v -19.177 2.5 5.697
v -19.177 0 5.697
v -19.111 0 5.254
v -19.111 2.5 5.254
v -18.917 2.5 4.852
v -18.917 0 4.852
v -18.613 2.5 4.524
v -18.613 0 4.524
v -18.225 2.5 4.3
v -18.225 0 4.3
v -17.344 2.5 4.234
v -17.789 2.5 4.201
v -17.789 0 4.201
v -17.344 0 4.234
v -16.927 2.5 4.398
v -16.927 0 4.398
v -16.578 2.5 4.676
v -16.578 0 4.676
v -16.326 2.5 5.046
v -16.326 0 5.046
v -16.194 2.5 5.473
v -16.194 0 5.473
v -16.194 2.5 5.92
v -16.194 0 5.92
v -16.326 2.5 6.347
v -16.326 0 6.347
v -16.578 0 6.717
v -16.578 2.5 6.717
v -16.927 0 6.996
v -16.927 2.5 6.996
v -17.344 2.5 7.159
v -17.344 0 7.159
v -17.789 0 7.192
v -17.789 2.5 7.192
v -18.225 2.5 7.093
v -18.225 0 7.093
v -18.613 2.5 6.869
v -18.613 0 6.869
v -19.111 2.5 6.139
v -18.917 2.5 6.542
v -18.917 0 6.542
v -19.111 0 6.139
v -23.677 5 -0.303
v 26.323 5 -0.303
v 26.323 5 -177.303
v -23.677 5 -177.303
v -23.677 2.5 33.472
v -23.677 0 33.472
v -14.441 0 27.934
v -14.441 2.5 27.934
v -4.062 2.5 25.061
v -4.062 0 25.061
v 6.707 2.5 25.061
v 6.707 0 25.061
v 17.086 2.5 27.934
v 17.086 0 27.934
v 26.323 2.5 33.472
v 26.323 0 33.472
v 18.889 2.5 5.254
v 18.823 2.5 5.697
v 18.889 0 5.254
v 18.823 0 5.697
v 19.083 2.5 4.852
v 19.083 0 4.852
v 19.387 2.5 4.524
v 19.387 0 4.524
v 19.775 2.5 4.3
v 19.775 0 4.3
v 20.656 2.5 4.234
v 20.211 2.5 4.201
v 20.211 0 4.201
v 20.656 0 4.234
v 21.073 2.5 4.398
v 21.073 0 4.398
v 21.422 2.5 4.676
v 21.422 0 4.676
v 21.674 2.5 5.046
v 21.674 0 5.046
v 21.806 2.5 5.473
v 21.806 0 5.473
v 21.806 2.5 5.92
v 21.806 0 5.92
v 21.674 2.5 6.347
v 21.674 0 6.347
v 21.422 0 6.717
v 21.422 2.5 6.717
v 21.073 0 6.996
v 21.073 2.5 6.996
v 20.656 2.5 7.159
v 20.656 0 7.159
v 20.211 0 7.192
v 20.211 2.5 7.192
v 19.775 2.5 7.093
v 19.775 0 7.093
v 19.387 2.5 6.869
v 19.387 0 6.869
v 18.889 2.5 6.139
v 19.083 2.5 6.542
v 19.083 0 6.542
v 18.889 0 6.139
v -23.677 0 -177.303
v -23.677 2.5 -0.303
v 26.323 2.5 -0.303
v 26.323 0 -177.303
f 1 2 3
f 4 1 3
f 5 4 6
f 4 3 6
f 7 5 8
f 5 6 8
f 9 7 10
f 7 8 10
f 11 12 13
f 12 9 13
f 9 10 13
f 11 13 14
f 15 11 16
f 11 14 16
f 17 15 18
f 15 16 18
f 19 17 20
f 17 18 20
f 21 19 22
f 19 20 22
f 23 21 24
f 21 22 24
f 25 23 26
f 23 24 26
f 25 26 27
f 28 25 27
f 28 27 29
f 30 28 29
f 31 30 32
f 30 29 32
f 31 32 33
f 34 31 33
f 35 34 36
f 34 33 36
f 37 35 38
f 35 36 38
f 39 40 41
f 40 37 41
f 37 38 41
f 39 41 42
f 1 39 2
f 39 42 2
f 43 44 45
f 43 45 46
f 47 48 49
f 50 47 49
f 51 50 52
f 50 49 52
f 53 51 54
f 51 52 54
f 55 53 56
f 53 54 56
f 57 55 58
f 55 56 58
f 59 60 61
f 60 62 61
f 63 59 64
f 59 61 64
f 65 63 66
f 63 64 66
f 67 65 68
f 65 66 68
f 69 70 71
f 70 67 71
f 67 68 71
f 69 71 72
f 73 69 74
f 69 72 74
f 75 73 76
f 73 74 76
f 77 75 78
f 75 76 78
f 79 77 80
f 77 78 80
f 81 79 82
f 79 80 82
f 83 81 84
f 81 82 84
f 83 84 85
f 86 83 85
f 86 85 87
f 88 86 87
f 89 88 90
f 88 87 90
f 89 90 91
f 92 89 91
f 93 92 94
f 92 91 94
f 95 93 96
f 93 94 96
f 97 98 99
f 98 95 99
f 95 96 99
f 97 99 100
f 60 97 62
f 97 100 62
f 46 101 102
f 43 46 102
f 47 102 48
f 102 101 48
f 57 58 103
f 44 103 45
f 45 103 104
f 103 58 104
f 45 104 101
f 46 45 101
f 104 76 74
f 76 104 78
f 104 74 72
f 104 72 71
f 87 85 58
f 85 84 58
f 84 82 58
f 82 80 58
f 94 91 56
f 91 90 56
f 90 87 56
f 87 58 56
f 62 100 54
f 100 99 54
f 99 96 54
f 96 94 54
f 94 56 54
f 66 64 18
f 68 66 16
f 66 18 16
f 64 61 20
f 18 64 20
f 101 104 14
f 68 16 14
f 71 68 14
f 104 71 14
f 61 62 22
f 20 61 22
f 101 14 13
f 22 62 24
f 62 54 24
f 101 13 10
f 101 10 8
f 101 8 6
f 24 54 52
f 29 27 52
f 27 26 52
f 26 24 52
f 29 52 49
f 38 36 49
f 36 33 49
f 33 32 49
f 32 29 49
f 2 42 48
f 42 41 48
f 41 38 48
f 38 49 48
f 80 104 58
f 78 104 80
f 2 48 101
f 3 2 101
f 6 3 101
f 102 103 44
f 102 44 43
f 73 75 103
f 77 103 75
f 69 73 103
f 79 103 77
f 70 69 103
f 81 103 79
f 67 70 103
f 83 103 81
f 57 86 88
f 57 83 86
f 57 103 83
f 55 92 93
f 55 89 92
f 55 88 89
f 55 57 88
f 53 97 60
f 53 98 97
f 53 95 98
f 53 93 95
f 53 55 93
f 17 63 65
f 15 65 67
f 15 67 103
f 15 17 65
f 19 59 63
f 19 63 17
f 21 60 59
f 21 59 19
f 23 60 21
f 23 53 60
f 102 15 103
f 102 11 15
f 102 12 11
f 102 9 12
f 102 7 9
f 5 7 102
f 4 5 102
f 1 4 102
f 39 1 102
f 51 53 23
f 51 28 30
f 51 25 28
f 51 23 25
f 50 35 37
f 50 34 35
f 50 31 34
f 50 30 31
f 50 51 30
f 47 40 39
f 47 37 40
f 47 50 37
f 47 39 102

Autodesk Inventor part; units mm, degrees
ref_plane "YZ Plane" through (0, 0, 0) normal (1, 0, 0) x (0, 1, 0)
ref_plane "XZ Plane" through (0, 0, 0) normal (0, 1, 0) x (-1, 0, 0)
ref_plane "XY Plane" through (0, 0, 0) normal (0, 0, 1) x (1, 0, 0)
sketch "Esboço1" plane through (0, 0, 0) normal (0, 1, 0) x (-1, 0, 0)
  line L0 (-1.3226, 64.6966) -> (-1.3226, 176.6966) construction
  line L1 (-1.3226, 64.6966) -> (-1.3226, 179.6966) construction
  line L2 (23.6774, 24.6966) -> (-26.3226, 24.6966)
  line L3 (-26.3226, 24.6966) -> (-26.3226, -57.3034)
  line L4 (-26.3226, -57.3034) -> (23.6774, -57.3034)
  line L5 (23.6774, -57.3034) -> (23.6774, 24.6966)
  line L6 (23.6774, -57.3034) -> (-26.3226, -57.3034)
  line L7 (-26.3226, -57.3034) -> (-26.3226, -177.3034)
  line L8 (-26.3226, -177.3034) -> (23.6774, -177.3034)
  line L9 (23.6774, -177.3034) -> (23.6774, -57.3034)
  line L10 (23.6774, 24.6966) -> (23.6774, 33.4716)
  line L11 (-26.3226, 24.6966) -> (-26.3226, 33.4716)
  line L12 (23.6774, 24.6966) -> (-26.3226, 24.6966)
  line L13 (-26.3226, 24.6966) -> (-26.3226, -0.3034)
  line L14 (-26.3226, -0.3034) -> (23.6774, -0.3034)
  line L15 (23.6774, -0.3034) -> (23.6774, 24.6966)
  circle A0 centre (17.6774, 5.6966) radius 1.5
  circle A1 centre (17.6774, 5.6966) radius 2.75
  circle A2 centre (-20.3226, 5.6966) radius 1.5
  circle A3 centre (-20.3226, 5.6966) radius 2.75
  arc A4 (-26.3226, 33.4716) -> (23.6774, 33.4716) centre (-1.3226, 64.6966) ccw
  point P0 (0, 0)
  point P1 (-26.3226, -57.3034)
  dimension "d8" = 120
  dimension "d9" = 50
  dimension "d10" = 25
  dimension "d11" = 25
  dimension "d12" = 50
  dimension "d13" = 3
  dimension "d14" = 6
  dimension "d15" = 6
  dimension "d16" = 5.5
extrude "Extrusão1" add sketch "Esboço1" along normal blind 2.5 contours L5 L14 L3 L2 | L2 A4 L10 | L2 L11 A4 | A1 | A3
extrude "Extrusão2" add sketch "Esboço1" along normal blind 5 contours L5 L4 L3 L14 | L9 L8 L7 L4
properties part number "peca2_suporte"
